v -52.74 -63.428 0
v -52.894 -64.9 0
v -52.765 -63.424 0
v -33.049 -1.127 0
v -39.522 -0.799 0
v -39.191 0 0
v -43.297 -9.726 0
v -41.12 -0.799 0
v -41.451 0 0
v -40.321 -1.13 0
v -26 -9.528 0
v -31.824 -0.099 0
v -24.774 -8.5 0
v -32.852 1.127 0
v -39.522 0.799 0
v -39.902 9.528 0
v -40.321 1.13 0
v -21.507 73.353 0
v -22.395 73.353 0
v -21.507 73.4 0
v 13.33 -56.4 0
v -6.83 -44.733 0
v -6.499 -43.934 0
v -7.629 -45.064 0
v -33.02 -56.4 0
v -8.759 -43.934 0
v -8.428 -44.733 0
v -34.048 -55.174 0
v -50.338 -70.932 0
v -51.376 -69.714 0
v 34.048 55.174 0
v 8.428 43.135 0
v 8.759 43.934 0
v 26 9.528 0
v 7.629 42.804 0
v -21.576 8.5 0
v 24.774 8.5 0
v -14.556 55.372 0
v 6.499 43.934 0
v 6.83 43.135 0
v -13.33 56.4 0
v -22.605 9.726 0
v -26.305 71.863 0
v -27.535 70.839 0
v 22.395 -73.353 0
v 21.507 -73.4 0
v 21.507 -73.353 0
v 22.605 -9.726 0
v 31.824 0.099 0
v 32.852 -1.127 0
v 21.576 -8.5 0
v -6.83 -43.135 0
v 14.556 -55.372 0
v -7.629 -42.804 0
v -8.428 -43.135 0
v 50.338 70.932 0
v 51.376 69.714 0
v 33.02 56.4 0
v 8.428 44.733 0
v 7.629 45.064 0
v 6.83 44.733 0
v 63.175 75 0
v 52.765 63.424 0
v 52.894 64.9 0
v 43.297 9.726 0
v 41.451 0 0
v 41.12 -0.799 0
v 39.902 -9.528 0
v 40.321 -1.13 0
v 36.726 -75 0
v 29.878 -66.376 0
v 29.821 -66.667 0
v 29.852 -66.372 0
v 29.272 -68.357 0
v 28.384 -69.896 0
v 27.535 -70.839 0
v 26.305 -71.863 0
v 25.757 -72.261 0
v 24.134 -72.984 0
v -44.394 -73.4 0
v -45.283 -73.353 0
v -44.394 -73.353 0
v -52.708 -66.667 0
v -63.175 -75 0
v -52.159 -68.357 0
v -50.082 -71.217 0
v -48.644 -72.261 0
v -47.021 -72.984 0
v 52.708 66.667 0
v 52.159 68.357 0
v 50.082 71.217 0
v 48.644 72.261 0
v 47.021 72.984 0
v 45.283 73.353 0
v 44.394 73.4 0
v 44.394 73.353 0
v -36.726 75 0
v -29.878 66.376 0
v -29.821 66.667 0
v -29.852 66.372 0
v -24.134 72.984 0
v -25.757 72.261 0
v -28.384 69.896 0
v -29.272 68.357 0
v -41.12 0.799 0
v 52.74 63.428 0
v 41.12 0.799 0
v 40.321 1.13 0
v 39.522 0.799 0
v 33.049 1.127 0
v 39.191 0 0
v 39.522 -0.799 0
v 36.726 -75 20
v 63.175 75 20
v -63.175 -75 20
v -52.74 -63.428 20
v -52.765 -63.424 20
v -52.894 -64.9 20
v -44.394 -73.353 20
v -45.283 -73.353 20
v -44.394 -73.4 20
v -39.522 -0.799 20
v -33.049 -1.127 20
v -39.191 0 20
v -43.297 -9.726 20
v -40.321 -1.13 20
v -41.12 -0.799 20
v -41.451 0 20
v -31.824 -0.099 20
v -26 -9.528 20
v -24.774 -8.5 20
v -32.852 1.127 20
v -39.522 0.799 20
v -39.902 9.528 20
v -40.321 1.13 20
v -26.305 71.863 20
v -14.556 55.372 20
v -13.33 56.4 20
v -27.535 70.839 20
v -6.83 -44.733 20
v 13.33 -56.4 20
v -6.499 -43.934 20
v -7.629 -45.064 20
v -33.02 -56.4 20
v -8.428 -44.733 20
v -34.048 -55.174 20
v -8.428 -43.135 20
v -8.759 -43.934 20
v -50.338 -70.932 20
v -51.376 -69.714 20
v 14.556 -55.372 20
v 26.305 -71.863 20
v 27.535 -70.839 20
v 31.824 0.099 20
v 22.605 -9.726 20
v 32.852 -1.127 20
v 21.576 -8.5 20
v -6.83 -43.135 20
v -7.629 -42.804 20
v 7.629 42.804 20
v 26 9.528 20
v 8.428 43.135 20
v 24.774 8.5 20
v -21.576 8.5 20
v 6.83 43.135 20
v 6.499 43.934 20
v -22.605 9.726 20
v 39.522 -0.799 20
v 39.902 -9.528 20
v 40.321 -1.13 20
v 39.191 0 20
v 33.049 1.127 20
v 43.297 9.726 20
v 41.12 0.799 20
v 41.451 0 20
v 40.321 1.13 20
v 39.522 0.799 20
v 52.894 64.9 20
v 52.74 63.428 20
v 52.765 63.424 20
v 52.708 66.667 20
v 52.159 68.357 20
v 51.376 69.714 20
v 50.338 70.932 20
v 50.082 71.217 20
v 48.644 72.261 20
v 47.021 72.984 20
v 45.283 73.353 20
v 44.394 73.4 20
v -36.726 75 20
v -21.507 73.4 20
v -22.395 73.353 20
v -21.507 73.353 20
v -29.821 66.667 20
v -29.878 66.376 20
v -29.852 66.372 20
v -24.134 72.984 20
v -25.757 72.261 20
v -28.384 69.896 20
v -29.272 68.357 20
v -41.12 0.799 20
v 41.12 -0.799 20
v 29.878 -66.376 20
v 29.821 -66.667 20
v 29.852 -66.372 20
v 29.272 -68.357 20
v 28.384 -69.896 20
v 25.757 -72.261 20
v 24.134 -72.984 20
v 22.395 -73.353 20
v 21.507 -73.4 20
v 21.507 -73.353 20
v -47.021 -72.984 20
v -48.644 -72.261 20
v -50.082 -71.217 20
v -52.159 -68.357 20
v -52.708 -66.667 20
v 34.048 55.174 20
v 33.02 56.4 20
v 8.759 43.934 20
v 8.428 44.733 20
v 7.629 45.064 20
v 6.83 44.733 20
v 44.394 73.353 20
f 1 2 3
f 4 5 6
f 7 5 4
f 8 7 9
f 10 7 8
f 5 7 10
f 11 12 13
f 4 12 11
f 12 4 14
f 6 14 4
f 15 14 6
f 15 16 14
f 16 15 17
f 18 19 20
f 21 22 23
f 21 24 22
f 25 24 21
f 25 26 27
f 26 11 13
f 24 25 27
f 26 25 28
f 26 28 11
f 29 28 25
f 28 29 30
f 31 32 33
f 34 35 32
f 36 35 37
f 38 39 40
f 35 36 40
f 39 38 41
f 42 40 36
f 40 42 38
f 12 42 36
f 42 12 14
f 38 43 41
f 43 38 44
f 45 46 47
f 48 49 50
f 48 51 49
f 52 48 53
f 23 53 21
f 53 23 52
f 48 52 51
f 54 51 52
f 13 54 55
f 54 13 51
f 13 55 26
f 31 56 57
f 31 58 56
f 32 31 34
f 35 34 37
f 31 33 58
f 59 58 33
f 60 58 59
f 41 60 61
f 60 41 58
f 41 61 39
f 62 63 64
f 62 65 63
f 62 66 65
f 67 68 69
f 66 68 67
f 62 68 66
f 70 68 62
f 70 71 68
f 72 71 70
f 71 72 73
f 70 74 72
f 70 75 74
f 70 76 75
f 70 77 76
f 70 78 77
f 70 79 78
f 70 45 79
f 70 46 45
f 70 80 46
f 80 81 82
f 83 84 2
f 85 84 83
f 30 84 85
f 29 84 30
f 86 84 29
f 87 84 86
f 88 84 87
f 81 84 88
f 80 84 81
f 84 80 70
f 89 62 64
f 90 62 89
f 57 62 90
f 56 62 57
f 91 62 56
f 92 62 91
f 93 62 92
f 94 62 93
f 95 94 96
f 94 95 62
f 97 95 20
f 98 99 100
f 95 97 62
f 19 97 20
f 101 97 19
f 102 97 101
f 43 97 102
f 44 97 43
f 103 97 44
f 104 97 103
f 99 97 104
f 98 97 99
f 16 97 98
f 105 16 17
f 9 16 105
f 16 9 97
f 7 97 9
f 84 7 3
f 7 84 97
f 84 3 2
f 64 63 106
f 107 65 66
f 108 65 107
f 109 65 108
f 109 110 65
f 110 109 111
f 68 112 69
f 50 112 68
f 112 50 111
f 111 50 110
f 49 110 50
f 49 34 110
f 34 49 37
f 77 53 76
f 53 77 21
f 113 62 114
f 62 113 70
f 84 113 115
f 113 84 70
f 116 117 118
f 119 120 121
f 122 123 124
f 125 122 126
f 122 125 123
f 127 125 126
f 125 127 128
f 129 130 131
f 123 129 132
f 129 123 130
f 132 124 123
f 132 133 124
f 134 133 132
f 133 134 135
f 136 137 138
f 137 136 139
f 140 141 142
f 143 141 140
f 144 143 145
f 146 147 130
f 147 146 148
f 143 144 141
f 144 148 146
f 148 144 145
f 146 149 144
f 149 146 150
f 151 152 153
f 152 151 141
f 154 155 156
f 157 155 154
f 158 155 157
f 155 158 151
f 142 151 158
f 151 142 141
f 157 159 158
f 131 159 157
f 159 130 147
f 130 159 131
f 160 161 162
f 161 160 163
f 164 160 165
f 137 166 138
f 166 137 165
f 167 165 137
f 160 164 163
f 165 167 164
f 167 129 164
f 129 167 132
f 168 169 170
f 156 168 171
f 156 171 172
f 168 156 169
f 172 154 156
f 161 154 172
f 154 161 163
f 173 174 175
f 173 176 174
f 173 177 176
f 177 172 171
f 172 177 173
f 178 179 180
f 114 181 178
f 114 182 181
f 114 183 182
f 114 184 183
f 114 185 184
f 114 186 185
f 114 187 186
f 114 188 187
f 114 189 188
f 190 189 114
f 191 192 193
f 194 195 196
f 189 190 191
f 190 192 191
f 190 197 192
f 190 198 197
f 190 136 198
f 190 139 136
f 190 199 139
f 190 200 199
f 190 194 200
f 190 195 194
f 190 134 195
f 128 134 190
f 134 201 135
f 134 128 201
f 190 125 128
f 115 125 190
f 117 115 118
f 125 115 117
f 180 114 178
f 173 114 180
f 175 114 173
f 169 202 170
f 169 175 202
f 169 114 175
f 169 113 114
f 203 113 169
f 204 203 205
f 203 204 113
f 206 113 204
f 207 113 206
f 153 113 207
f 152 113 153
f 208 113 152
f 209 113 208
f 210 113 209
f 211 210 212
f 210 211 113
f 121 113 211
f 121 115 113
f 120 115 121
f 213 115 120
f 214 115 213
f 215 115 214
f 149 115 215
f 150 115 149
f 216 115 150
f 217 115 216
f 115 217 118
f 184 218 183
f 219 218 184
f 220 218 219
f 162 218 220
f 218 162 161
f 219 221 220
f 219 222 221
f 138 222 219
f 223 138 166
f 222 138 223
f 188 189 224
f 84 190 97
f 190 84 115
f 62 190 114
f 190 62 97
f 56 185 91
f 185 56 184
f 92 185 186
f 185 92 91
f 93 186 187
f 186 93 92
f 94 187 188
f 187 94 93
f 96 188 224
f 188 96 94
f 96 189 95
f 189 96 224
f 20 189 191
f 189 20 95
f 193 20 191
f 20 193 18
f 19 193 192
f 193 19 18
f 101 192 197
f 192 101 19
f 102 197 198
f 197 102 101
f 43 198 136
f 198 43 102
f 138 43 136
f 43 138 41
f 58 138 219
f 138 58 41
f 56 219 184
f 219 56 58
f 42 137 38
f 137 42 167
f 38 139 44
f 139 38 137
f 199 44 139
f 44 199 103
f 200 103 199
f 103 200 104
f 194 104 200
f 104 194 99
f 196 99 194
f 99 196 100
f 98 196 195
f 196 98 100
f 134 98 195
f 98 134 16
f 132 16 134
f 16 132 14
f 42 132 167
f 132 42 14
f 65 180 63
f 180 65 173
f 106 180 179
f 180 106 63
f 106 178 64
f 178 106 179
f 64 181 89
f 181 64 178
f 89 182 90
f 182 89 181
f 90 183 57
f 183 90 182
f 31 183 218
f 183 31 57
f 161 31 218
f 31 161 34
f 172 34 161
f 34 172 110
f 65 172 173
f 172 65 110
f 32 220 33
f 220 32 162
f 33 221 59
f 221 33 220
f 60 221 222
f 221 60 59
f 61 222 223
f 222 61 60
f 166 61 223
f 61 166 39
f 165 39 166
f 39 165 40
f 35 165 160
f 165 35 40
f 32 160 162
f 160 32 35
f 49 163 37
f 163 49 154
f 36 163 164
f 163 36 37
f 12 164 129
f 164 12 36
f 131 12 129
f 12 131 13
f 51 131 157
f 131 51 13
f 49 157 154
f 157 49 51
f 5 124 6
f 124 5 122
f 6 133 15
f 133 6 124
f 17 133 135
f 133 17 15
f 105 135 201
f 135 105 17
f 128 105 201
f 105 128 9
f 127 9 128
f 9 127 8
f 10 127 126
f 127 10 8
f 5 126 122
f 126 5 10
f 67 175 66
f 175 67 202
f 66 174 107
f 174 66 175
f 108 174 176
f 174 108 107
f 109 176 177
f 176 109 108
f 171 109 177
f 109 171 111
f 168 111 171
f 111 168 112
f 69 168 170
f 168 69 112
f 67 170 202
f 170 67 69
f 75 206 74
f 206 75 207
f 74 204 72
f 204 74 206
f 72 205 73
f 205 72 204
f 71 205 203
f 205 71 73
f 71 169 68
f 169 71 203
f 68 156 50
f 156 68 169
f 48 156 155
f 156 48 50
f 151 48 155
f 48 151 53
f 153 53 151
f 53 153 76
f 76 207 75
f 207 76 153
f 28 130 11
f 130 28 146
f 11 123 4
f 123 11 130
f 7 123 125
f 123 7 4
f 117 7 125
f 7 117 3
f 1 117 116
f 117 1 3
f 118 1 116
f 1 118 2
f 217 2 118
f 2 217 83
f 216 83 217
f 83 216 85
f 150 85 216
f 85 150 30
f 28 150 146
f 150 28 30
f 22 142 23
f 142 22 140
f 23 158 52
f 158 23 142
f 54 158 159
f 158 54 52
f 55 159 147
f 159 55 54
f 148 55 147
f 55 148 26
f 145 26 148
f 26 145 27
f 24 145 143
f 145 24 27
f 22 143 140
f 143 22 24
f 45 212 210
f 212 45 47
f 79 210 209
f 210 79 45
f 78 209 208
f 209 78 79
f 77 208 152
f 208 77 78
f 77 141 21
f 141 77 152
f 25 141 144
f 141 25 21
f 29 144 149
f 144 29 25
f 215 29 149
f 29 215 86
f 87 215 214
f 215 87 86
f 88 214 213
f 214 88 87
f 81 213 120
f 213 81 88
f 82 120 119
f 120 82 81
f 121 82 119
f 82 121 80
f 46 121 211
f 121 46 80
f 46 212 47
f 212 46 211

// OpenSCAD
/* [Basic Parameters] */

// Character Height.  (Full height of the printed block, not the height of the individual segments.)
character_height = 150;

// Wall Thickness.  Default = 1.6mm.
wall_thickness = 1.6;

// Which part do you want to make?
part = "DigitParts"; // [DigitParts:Diffused Lenses and Case,DigitCase:Case Only,DigitLens:Diffused Segments,Clock4:4 Digit Clock (no lenses),Clock4Lens:4 Digit Clock Lenses,Clock6:6 Digit Clock (no lenses),Clock6Lens:6 Digit Clock Lenses]

// Segment Width:  In mm
segment_width = 17;

// How thick should the case be?
character_thickness = 18;

// How thick should a lens be?
lens_thickness = 1.6;

/* [Tweaks for advanced users] */

// What is the hole size you need for mounting?
mount_hole_size = 2.26;

// What type of digits?
digit_type = 7; // [7:7 Segment,8:7 Segment and Dot,9:7 Segment and Colon,10:7 Segment-Colon-Dot,11:7 Segment-Colon-Dot-Dot,14:Alphanumeric,15:Alphanumeric and Dot,16:Alphanumeric and Colon,17:Alphanumeric-Colon-Dot,18:Alphanumeric-Colon-Dot-Dot]

// Slant the digits by how many degrees?
slant = 10; // [0:25]

// How far should the characters be spaced?
spacing = 1;  // [1.5:Close Together,2:Loose,2.5:Far Apart

/* [Hidden] */

/* 
 * Example Code
 */
single();

module example1(){
    for (slant = [0,25]){
        segment_height = (character_height - wall_thickness*2 - segment_width)/cos(slant)/2;
        translate([slant*8,0,0])
        difference(){
            linear_extrude(20)
            case(segment_height, segment_width, slant, wall_thickness,    spacing, digit_type);
            translate([0,0,-5])
            linear_extrude(30){
                segments_7(segment_height, segment_width, slant, wall_thickness);
                
            }
            translate([segment_height/2+segment_width*1.5+wall_thickness,0,-5])
            linear_extrude(30){
                colon(segment_height, segment_width, slant, spacing);
                dotdot(segment_height, segment_width, slant, spacing);
            }
        }
    }
}

module example2(){
    translate([0,character_height*.75,0])
    clock4(character_height, segment_width, 0, wall_thickness, spacing,         digit_type, character_thickness);
    translate([0,-character_height*.75,0])
    clock4(character_height, segment_width, 25, wall_thickness, spacing,         digit_type, character_thickness);
}

module single(){
    segment_height = (character_height - wall_thickness*2 - segment_width)/cos(slant)/2;
    difference(){
        linear_extrude(20)
        case(segment_height, segment_width, slant, wall_thickness, spacing, digit_type);
        translate([0,0,-5])
        linear_extrude(30){
            if(floor(digit_type/7)==1){    
                segments_7(segment_height, segment_width, slant, wall_thickness);
            } else {
                segments_14(segment_height, segment_width, slant, wall_thickness);
            }
            
            for(x = [-1,1]){
                translate([x*segment_height/3*2*sin(slant),x*segment_height/3*2,0])
                circle(d = mount_hole_size, $fs=1, center=true);
                translate([x*(segment_height/2+segment_width/2-mount_hole_size/2),0,0])
                circle(d = mount_hole_size, $fs=1, center =true);
            }
        }
        translate([segment_height/2+segment_width*1.5+wall_thickness,0,-5])
        linear_extrude(30){
            if(digit_type%7==1){
                dot(segment_height,segment_width, slant, spacing);
            }
            if(digit_type%7==2){
                colon(segment_height, segment_width, slant, spacing);
            }
            if(digit_type%7==3){
                dot(segment_height,segment_width, slant, spacing);
                colon(segment_height, segment_width, slant, spacing);
            }
            if(digit_type%7==4){
                dotdot(segment_height,segment_width, slant, spacing);
                colon(segment_height, segment_width, slant, spacing);
            }
            
            
        }
    }
}

module slants(){
    xspace = sin(slant)*character_height;
    linear_extrude(character_thickness)
    for(x = [0,180]){
        rotate(x)
        polygon([[-xspace,-character_height/2],[-xspace,character_height/2],[-0,character_height/2]]);
    }
}

module segments_7(segment_height = 100, segment_width = 10, slant=10, wall_thickness=1.6){
    segment_shift_x = segment_height/2 * sin(slant);
    segment_shift_y = segment_height/2 * cos(slant);    
    difference(){
        union(){
            for (x = [1, -1]){
                for (y = [1,-1]){
                    // draw the basic segments
                    translate([x * segment_height/2 + y * segment_shift_x, y * segment_shift_y,0])
                    rotate([0,0,-slant])
                    square([segment_width, segment_height],center=true);
                    // round the corners
                    translate([x * segment_height/2 + y * segment_shift_x * 2, y * cos(slant) * segment_height, 0])
                    circle(r = segment_width/2, $fs=.5);
                }
            }
            for (y = [-1:1:1]){
                translate([y * segment_shift_x*2 , y * cos(slant) * segment_height,0])
                square([segment_height, segment_width], center= true);
            }
        } // end union for segments
        for (y = [-1,1]){ // split the segments
            for (r = [-1,1]){
                translate([y * segment_shift_x, y * segment_shift_y])
                rotate([0,0,r * 45-slant/2])
                square([segment_height*3, wall_thickness],center=true);
            }
        }
        // remove the left overs on the x axis
        for( r = [0,180]){
            rotate([0,0,r]){
                translate([segment_height/2 ,0,0])
                rotate([0,0, (-45-slant/2)])
                square([segment_width*2,segment_width*2]);
            }
        }
    }
}

module segments_14(segment_height = 100, segment_width = 10, slant=10, wall_thickness=1.6){
    segment_shift_x = segment_height/2 * sin(slant);
    segment_shift_y = segment_height/2 * cos(slant);
    difference(){
        union(){
            segments_7(segment_height, segment_width, slant);
            for (y = [1,-1]){
                // draw the basic segments
                translate([y * segment_shift_x, y * segment_shift_y,0])
                rotate([0,0,-slant])
                square([segment_width, segment_height],center=true);
            }
        } // union
        for (r = [-1,1]){
            translate([y * segment_shift_x, segment_shift_y])
            rotate([0,0,r * 45-slant/2])
            square([segment_width*3, wall_thickness],center=true);
        }
        for (y = [-1,1]){
            translate([y * segment_shift_x*2 , y * cos(slant) * segment_height - y * (segment_width/2+wall_thickness/2),0])
            square([segment_width*2, wall_thickness], center= true);
        }
    }
    difference(){
        union(){
            theta1 = atan2(cos(slant) * segment_height,segment_height/2 + segment_shift_x * 2);
            rotate([0,0,theta1])
            square([(segment_shift_y*2/sin(theta1))*2, segment_width], center = true);
            theta2 = atan2(cos(slant) * -segment_height, segment_height/2 - segment_shift_x*2);
            rotate([0,0,theta2])
            square([(segment_shift_y*2/sin(abs(theta2)))*2, segment_width], center = true);
        } // diagonal segments
        offset(wall_thickness)union(){
            segments_7(segment_height, segment_width, slant);  // basic outline
            for (y = [1,-1]){ // vertical middle segments
                translate([y * segment_shift_x, y * segment_shift_y,0])
                rotate([0,0,-slant])
                square([segment_width, segment_height],center=true);
            }
        }
    }
}

module dot(segment_height = 100, segment_width = 10, slant=10, spacing=1){
    dot_shift_x = -(segment_height-segment_width/3) * sin(slant);
    translate([dot_shift_x, cos(slant) * -segment_height + segment_width/3, 0])
    circle(r = segment_width/1.5, $fs=.5);
}

module dotdot(segment_height = 100, segment_width = 10, slant=10, spacing=1){
    dot_shift_x = (segment_height-segment_width/3) * sin(slant);
    for( y = [-1,1]){
        translate([y * dot_shift_x, cos(slant) * y * segment_height - y * segment_width/3, 0])
        circle(r = segment_width/1.5, $fs=.5, center=true);
    }
}

module colon(segment_height = 100, segment_width = 10, slant=10, spacing=1){
    dot_shift_x = segment_height/2 * sin(slant);
    for( y = [-1, 1]){
        translate([y * dot_shift_x, 0.5 * cos(slant) * y * segment_height, 0])
        circle(r = segment_width/1.5, $fs=.5);
    }
}

module case(segment_height = 100, segment_width = 10, slant=10, wall_thickness=1.6, spacing = 1, digit_type=7){
    corner_x = (segment_height + (segment_width/2 + wall_thickness)/cos(slant)) * sin(slant) ;
    corner_y = segment_height * cos(slant) + segment_width/2  + wall_thickness;
    if (digit_type % 7 == 0){
        // no dots to deal with
        #polygon([[-segment_height/2 - spacing * segment_width + corner_x, corner_y], 
            [segment_height/2 + spacing * segment_width + corner_x, corner_y],
            [segment_height/2 + spacing * segment_width- corner_x, -corner_y],
            [-segment_height/2 - spacing * segment_width - corner_x, -corner_y]]);
    } else {
        // have to account for dots
        #polygon([[-segment_height/2 - spacing * segment_width + corner_x, corner_y], 
            [segment_height/2 + segment_width*(spacing+.5) + spacing * segment_width + corner_x, corner_y],
            [segment_height/2 + segment_width*(spacing+.5) + spacing * segment_width- corner_x, -corner_y],
            [-segment_height/2 - spacing * segment_width - corner_x, -corner_y]]);

    }
}

module clock4(character_height = 100, segment_width = 10, slant=10, wall_thickness=1.6, spacing = 1, digit_type=7, character_thickness = 10){
    segment_height = (character_height - wall_thickness*2 - segment_width)/cos(slant)/2;
    echo(slant=slant);
    echo(segment_height=segment_height);
    space_factor1 = segment_height/2 + segment_width*spacing/2+segment_width*1.5/2+wall_thickness;
    space_factor2 = segment_height+segment_width + segment_width*spacing;
    box_factor = (segment_height)*sin(slant);
    echo(box_factor=box_factor);
    difference(){
        // Case 
        linear_extrude(character_thickness)
        square([space_factor1*4-segment_width+wall_thickness*2+space_factor2*2+box_factor*2
        ,character_height], center=true);
        
        for(x = [-space_factor1 - space_factor2,
            -space_factor1, space_factor1,
            space_factor1 + space_factor2]){
            translate([x,0,-5])
            linear_extrude(character_thickness+10){
                segments_7(segment_height, segment_width, slant, wall_thickness);
            }
        }
            
        translate([0,0,-5])
        linear_extrude(character_thickness+10){
            colon(segment_height, segment_width, slant, spacing);
            dotdot(segment_height, segment_width, slant, spacing);
        }
    }
    
}
